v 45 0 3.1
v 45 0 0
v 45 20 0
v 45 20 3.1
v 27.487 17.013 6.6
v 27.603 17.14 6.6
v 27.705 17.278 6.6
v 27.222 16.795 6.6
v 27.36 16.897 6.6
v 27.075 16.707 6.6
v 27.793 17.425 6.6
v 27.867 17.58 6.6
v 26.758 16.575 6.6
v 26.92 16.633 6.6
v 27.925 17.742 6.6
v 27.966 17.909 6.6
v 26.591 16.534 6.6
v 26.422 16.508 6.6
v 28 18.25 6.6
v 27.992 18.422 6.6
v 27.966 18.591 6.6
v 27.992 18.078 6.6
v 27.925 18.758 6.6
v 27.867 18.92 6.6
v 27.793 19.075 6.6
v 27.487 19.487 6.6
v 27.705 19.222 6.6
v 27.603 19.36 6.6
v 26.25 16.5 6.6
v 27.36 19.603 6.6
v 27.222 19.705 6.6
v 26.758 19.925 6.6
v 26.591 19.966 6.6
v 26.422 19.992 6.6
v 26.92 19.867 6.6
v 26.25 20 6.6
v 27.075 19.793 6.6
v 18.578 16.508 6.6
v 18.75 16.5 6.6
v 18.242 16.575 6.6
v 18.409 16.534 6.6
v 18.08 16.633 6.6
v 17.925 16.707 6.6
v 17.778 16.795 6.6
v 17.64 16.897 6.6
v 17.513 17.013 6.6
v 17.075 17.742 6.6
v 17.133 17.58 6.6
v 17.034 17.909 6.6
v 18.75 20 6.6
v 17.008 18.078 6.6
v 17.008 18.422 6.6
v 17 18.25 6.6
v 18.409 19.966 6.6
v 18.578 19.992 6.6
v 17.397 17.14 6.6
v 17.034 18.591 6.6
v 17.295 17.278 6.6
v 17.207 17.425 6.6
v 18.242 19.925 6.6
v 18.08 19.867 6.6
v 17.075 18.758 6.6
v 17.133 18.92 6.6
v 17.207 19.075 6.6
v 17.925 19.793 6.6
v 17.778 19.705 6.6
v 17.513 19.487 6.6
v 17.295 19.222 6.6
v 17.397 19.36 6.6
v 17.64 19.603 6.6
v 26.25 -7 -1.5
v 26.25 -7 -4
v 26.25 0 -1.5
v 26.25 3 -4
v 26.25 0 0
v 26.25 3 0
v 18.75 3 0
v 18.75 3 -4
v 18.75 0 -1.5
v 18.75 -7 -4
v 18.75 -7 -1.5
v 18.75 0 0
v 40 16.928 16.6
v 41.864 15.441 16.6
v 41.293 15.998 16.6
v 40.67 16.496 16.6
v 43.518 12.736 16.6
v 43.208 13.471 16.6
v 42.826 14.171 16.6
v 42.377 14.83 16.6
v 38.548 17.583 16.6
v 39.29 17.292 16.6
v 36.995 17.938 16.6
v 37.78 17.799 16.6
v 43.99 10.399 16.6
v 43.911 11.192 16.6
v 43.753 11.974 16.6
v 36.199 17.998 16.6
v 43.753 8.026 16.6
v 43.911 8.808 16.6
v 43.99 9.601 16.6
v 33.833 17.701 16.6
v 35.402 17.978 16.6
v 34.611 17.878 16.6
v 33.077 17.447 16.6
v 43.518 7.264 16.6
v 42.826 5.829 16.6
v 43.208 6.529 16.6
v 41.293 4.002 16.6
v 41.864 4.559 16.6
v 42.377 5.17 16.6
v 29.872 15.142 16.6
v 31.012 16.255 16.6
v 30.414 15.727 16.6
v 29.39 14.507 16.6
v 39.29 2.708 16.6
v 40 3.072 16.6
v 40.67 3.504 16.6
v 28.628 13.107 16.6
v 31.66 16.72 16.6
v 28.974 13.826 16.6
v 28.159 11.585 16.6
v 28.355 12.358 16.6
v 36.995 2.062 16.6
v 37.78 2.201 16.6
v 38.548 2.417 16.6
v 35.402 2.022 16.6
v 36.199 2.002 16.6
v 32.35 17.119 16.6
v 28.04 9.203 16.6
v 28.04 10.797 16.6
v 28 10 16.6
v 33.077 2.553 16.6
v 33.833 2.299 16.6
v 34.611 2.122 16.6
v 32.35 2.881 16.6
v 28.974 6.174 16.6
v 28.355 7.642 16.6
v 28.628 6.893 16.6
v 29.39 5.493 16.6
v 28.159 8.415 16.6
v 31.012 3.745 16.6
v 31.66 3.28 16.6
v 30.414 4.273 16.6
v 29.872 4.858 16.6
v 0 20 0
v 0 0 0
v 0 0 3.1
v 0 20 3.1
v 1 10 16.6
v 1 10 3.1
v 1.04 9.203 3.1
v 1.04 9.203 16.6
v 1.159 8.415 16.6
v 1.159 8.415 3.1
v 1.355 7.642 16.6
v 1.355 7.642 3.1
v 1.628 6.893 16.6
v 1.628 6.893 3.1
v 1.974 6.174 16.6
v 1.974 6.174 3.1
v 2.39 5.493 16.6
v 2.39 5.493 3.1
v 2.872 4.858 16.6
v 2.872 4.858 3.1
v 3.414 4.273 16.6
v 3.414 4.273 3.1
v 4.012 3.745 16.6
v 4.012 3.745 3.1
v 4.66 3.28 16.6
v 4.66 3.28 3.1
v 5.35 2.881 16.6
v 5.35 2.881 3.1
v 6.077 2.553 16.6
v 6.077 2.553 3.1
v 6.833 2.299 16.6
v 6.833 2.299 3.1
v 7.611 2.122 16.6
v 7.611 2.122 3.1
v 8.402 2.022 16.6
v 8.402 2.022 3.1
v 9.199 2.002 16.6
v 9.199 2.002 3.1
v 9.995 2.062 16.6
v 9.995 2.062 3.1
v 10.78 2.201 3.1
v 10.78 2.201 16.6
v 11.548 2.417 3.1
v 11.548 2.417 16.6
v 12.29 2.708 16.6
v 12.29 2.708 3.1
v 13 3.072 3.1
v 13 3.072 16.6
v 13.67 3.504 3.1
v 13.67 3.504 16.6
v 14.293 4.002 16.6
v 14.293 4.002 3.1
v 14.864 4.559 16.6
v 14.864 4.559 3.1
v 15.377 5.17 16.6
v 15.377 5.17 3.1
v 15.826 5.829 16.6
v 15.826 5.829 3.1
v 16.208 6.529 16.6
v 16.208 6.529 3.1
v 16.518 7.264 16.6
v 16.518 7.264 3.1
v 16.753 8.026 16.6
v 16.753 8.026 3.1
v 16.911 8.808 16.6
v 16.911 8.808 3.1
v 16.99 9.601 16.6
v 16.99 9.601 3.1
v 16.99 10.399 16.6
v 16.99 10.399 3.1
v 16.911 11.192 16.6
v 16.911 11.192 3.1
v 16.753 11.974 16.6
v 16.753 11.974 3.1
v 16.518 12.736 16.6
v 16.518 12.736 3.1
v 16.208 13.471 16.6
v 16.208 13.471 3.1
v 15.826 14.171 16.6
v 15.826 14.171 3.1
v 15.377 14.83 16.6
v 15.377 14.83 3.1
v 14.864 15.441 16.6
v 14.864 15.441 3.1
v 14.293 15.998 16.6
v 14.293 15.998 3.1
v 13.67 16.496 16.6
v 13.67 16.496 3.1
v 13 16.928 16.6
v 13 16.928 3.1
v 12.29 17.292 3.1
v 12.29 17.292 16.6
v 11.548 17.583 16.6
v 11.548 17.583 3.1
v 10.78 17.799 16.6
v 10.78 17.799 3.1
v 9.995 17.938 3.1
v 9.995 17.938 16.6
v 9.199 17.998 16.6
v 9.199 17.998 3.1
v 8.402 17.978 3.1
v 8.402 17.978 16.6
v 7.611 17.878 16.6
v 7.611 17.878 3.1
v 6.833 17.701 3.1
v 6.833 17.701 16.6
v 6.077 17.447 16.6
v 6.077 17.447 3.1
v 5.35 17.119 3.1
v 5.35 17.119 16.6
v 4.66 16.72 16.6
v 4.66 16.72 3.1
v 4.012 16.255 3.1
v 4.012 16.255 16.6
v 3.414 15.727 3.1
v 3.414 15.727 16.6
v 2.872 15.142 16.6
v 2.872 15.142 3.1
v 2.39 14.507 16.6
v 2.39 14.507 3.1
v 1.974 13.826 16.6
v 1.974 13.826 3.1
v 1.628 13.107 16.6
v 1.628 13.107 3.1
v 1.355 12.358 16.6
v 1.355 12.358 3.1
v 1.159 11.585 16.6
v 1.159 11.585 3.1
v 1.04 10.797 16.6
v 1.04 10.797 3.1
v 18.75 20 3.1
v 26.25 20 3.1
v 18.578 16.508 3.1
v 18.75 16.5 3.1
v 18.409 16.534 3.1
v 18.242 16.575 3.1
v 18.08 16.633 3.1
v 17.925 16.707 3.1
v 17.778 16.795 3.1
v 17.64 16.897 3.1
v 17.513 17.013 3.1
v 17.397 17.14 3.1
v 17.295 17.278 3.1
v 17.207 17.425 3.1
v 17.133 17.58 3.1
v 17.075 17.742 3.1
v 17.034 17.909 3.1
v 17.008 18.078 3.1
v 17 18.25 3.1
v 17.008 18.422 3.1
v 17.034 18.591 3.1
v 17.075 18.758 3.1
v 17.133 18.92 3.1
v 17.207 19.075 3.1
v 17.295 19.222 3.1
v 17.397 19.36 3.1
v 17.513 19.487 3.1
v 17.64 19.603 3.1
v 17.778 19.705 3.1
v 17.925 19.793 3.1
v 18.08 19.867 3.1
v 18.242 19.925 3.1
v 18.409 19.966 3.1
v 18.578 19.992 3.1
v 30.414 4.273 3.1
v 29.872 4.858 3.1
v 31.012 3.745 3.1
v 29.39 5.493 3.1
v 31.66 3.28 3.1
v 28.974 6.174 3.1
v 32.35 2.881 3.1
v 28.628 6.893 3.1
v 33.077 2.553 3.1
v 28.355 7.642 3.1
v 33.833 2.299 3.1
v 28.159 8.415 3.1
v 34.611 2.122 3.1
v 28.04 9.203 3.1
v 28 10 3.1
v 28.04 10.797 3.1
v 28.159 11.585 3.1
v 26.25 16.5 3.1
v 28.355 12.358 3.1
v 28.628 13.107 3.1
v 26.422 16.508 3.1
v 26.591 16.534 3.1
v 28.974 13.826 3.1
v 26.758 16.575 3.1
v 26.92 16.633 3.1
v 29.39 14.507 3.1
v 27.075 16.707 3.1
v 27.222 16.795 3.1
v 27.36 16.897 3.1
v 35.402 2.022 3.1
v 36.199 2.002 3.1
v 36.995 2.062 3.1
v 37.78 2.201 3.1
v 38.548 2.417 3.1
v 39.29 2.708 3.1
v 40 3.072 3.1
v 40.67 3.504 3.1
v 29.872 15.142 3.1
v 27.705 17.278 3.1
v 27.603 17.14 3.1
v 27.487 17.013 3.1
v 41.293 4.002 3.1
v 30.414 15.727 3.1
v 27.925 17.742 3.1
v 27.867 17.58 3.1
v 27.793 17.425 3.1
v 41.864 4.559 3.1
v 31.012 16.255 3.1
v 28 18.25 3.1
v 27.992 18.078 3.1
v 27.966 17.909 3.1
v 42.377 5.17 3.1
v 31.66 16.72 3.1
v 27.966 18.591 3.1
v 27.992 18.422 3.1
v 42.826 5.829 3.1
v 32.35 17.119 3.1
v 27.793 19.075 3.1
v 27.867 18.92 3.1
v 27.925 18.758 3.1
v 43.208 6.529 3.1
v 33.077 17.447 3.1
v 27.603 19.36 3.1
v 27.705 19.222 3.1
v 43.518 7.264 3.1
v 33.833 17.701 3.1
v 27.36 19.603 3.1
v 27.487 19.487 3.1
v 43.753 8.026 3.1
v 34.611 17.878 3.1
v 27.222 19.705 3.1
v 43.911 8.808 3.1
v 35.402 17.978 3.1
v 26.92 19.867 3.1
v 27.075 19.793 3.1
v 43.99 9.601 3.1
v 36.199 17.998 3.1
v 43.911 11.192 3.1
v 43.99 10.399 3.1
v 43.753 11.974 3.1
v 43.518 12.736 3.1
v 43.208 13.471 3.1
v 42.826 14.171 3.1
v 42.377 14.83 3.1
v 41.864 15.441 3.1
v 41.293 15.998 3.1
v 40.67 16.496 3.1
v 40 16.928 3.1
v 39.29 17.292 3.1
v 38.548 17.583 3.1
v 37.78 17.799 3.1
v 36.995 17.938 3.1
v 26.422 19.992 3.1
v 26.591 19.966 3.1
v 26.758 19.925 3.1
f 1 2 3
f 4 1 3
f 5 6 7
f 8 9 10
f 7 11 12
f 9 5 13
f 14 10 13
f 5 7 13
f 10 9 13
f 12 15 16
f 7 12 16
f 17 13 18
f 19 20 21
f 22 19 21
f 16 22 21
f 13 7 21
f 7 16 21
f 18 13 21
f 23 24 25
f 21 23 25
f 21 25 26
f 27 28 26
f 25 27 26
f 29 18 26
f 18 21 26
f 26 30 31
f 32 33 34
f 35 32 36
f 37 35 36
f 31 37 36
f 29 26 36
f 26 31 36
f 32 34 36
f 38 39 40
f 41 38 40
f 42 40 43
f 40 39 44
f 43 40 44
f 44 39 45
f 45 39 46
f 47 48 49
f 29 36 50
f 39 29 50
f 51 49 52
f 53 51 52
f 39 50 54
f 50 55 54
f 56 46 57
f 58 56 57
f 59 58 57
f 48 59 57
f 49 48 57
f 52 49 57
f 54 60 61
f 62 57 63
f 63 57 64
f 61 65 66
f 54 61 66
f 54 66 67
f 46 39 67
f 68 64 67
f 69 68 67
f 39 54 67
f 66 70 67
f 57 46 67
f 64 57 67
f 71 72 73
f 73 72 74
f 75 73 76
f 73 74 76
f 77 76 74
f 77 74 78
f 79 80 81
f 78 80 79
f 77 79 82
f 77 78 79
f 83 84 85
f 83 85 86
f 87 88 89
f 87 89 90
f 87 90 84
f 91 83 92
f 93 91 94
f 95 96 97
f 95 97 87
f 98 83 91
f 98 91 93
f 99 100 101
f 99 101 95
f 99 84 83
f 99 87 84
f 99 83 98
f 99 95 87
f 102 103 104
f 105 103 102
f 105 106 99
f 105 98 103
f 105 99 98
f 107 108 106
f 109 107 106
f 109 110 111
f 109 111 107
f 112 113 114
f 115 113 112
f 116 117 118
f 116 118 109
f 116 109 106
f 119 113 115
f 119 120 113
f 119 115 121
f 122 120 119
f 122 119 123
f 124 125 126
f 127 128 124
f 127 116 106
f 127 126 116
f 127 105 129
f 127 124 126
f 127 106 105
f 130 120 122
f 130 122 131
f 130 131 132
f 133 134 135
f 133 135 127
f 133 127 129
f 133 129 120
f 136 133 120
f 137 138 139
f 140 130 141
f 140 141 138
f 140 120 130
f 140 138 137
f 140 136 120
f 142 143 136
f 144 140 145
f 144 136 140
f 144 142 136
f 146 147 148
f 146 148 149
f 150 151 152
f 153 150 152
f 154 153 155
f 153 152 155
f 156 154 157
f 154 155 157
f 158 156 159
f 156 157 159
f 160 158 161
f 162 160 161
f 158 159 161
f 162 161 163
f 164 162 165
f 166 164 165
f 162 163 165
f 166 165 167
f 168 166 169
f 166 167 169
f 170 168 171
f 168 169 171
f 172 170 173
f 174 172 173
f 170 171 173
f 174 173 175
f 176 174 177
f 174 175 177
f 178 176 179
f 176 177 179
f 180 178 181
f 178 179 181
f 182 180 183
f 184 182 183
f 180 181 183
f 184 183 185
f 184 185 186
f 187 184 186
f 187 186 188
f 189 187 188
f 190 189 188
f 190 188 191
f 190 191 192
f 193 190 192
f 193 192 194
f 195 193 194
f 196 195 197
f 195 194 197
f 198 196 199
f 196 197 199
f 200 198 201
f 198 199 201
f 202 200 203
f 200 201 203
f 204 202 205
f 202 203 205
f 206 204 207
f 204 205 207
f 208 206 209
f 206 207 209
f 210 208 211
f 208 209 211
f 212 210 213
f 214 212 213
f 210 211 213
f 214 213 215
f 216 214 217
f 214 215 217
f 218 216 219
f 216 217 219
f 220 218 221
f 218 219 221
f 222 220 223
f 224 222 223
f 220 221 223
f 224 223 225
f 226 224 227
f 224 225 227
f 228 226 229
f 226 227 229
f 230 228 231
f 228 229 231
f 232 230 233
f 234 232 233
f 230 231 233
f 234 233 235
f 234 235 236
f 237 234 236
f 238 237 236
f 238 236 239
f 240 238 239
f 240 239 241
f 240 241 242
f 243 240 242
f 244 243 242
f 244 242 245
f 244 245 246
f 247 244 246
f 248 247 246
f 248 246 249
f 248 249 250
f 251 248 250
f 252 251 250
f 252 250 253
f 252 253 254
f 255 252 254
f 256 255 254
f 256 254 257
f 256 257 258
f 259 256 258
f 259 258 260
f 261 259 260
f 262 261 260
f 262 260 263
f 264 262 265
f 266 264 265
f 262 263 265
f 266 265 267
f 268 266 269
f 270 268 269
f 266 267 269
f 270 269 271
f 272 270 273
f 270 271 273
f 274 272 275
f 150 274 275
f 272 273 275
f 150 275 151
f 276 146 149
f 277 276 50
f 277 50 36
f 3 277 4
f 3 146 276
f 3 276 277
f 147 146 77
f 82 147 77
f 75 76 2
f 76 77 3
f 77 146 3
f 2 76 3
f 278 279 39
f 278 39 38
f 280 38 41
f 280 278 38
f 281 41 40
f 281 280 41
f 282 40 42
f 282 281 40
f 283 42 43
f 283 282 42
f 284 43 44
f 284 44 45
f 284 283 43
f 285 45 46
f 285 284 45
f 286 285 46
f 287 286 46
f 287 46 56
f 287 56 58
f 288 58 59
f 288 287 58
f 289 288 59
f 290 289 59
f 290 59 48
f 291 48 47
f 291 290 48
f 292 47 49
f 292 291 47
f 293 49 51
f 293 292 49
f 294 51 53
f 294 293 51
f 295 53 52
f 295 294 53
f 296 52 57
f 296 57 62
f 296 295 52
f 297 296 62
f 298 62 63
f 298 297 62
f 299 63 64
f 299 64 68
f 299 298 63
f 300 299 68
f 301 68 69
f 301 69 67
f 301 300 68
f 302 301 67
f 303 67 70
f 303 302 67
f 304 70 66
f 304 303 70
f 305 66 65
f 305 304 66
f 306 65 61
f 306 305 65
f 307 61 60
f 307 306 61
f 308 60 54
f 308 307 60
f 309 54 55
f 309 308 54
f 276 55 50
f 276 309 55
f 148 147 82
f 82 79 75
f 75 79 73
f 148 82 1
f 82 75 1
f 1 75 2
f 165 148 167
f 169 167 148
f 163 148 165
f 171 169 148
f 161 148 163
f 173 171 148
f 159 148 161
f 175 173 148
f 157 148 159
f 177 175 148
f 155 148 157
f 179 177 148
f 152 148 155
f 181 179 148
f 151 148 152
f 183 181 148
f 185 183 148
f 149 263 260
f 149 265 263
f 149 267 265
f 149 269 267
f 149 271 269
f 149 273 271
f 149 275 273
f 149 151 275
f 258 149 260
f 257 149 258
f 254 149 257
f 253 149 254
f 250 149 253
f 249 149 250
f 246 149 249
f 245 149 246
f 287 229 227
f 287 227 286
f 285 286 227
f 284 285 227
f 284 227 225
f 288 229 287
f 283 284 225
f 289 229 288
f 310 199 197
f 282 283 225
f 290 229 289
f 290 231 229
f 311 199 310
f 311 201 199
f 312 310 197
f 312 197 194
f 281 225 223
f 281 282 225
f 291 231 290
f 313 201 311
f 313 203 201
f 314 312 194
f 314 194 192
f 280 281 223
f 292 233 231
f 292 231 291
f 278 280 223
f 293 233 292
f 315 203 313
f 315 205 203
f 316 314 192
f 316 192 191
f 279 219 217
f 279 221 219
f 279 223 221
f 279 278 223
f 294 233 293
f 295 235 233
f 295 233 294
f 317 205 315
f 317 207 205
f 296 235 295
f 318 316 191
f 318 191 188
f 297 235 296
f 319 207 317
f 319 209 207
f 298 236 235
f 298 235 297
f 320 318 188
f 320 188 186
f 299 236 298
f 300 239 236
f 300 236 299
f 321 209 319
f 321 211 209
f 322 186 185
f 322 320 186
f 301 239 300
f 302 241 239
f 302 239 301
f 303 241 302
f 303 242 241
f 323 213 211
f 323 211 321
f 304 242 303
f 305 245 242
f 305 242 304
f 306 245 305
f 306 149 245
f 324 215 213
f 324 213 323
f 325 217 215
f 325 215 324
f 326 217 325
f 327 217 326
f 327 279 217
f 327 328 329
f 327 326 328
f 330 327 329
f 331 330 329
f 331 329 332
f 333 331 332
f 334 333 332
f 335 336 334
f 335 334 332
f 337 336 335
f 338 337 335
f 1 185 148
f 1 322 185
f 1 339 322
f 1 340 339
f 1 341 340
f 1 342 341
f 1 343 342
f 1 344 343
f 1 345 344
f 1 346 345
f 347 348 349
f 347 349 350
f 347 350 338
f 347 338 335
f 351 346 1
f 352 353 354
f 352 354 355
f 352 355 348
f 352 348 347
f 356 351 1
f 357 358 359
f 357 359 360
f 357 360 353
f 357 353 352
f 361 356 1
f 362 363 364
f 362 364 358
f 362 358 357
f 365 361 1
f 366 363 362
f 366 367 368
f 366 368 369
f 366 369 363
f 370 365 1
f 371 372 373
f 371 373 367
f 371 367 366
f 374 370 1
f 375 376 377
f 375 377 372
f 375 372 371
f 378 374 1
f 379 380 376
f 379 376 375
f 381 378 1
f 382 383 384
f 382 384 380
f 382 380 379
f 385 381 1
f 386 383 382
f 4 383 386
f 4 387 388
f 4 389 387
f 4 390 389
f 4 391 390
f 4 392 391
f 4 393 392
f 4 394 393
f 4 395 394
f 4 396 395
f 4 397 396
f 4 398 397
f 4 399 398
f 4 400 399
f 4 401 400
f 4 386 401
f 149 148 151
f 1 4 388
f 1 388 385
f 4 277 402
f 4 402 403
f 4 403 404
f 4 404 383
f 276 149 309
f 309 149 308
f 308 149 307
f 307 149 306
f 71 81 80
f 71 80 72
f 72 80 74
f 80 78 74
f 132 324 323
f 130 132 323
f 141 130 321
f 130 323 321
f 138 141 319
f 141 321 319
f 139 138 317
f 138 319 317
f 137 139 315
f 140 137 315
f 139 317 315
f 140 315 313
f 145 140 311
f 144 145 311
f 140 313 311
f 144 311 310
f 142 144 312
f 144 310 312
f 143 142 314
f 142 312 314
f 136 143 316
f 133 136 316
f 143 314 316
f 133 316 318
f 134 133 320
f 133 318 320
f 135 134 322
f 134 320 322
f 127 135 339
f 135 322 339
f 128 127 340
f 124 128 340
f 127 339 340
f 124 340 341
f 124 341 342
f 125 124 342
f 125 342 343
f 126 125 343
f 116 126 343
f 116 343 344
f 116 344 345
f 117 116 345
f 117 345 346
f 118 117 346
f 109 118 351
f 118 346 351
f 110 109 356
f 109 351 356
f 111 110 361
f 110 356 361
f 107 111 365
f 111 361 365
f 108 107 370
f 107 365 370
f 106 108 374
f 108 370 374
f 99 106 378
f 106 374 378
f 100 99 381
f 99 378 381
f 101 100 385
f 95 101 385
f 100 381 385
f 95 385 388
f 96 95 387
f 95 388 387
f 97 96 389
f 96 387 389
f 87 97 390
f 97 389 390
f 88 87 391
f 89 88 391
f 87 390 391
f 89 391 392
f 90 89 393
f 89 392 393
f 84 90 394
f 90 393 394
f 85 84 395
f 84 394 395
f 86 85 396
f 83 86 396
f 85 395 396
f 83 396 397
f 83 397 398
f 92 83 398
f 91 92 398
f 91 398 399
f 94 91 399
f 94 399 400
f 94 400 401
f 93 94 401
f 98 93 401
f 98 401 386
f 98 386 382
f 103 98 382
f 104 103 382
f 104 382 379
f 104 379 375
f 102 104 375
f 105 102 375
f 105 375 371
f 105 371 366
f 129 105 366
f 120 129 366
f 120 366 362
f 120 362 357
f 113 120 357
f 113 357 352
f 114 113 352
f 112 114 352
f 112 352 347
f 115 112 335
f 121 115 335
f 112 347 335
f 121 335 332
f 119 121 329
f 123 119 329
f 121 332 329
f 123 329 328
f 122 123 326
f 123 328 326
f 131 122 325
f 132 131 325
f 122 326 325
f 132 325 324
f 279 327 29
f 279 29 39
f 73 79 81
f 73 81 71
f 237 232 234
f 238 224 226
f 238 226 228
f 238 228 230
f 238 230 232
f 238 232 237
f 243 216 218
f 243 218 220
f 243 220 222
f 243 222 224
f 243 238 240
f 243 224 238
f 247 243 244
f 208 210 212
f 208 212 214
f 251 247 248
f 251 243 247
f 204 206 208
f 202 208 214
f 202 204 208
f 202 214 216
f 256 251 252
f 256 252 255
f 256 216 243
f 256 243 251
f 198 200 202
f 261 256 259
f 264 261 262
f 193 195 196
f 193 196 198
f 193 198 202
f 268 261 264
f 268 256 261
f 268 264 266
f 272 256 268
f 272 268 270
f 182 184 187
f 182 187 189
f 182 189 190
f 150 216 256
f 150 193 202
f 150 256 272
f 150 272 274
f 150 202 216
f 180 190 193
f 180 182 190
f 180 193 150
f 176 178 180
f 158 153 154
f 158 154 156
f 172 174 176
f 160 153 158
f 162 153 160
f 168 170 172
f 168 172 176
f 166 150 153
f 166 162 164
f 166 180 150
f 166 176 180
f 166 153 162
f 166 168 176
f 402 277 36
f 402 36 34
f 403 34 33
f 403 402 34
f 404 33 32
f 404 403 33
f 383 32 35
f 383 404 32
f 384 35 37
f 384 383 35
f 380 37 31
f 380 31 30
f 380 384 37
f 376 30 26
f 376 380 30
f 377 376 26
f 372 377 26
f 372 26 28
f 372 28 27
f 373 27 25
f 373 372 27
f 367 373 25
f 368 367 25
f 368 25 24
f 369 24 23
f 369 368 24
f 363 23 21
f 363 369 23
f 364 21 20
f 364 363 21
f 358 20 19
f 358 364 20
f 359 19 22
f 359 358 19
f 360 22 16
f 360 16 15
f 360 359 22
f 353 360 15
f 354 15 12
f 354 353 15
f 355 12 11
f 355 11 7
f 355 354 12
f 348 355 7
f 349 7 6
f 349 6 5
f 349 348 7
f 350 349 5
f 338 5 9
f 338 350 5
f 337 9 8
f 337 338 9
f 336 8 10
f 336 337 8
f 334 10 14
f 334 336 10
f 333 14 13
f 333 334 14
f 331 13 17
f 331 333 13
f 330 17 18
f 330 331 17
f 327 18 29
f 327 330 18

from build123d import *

# Parameters (mm, degrees)
SCHIZZO1_W                   = 45
SCHIZZO1_H                   = 20
ESTRUSIONE_ESTRUSIONE1_DEPTH = 3.1
SCHIZZO2_R                   = 8
ESTRUSIONE_ESTRUSIONE2_DEPTH = 13.5
SCHIZZO3_W                   = 7.5
SCHIZZO3_H                   = 3
ESTRUSIONE_ESTRUSIONE3_DEPTH = 4
ESTRUSIONE_ESTRUSIONE4_DEPTH = 3.5
SCHIZZO5_W                   = 7.5
SCHIZZO5_H                   = 2.5
ESTRUSIONE_ESTRUSIONE5_DEPTH = 7


with BuildPart() as part:
    # Schizzo1 → Estrusione-Estrusione1 (new body)
    with BuildSketch(Plane.XY):
        with Locations((22.5, 10)):
            Rectangle(SCHIZZO1_W, SCHIZZO1_H)
    extrude(amount=ESTRUSIONE_ESTRUSIONE1_DEPTH)

    # Schizzo2 → Estrusione-Estrusione2 (add)
    with BuildSketch(Plane.XY.offset(3.1)):
        with Locations(Location((9, 10, 0), (0, 0, 180))):
            Circle(SCHIZZO2_R)
        with Locations(Location((36, 10, 0), (0, 0, 180))):
            Circle(SCHIZZO2_R)
    extrude(amount=ESTRUSIONE_ESTRUSIONE2_DEPTH)

    # Schizzo3 → Estrusione-Estrusione3 (add)
    with BuildSketch(Plane(origin=(0, 0, 0), x_dir=(-1, 0, 0), z_dir=(0, 0, -1))):
        with Locations((-22.5, 1.5)):
            Rectangle(SCHIZZO3_W, SCHIZZO3_H)
    extrude(amount=ESTRUSIONE_ESTRUSIONE3_DEPTH)

    # Schizzo4 → Estrusione-Estrusione4 (add)
    with BuildSketch(Plane.XY.offset(3.1)):
        with BuildLine():
            Line((18.75, 20), (26.25, 20))
            ThreePointArc((26.25, 20), (28, 18.25), (26.25, 16.5))
            Line((26.25, 16.5), (18.75, 16.5))
            ThreePointArc((18.75, 16.5), (17, 18.25), (18.75, 20))
        make_face()
    extrude(amount=ESTRUSIONE_ESTRUSIONE4_DEPTH)

    # Schizzo5 → Estrusione-Estrusione5 (add)
    with BuildSketch(Plane.XZ):
        with Locations((22.5, -2.75)):
            Rectangle(SCHIZZO5_W, SCHIZZO5_H)
    extrude(amount=ESTRUSIONE_ESTRUSIONE5_DEPTH)


solid = part.part
